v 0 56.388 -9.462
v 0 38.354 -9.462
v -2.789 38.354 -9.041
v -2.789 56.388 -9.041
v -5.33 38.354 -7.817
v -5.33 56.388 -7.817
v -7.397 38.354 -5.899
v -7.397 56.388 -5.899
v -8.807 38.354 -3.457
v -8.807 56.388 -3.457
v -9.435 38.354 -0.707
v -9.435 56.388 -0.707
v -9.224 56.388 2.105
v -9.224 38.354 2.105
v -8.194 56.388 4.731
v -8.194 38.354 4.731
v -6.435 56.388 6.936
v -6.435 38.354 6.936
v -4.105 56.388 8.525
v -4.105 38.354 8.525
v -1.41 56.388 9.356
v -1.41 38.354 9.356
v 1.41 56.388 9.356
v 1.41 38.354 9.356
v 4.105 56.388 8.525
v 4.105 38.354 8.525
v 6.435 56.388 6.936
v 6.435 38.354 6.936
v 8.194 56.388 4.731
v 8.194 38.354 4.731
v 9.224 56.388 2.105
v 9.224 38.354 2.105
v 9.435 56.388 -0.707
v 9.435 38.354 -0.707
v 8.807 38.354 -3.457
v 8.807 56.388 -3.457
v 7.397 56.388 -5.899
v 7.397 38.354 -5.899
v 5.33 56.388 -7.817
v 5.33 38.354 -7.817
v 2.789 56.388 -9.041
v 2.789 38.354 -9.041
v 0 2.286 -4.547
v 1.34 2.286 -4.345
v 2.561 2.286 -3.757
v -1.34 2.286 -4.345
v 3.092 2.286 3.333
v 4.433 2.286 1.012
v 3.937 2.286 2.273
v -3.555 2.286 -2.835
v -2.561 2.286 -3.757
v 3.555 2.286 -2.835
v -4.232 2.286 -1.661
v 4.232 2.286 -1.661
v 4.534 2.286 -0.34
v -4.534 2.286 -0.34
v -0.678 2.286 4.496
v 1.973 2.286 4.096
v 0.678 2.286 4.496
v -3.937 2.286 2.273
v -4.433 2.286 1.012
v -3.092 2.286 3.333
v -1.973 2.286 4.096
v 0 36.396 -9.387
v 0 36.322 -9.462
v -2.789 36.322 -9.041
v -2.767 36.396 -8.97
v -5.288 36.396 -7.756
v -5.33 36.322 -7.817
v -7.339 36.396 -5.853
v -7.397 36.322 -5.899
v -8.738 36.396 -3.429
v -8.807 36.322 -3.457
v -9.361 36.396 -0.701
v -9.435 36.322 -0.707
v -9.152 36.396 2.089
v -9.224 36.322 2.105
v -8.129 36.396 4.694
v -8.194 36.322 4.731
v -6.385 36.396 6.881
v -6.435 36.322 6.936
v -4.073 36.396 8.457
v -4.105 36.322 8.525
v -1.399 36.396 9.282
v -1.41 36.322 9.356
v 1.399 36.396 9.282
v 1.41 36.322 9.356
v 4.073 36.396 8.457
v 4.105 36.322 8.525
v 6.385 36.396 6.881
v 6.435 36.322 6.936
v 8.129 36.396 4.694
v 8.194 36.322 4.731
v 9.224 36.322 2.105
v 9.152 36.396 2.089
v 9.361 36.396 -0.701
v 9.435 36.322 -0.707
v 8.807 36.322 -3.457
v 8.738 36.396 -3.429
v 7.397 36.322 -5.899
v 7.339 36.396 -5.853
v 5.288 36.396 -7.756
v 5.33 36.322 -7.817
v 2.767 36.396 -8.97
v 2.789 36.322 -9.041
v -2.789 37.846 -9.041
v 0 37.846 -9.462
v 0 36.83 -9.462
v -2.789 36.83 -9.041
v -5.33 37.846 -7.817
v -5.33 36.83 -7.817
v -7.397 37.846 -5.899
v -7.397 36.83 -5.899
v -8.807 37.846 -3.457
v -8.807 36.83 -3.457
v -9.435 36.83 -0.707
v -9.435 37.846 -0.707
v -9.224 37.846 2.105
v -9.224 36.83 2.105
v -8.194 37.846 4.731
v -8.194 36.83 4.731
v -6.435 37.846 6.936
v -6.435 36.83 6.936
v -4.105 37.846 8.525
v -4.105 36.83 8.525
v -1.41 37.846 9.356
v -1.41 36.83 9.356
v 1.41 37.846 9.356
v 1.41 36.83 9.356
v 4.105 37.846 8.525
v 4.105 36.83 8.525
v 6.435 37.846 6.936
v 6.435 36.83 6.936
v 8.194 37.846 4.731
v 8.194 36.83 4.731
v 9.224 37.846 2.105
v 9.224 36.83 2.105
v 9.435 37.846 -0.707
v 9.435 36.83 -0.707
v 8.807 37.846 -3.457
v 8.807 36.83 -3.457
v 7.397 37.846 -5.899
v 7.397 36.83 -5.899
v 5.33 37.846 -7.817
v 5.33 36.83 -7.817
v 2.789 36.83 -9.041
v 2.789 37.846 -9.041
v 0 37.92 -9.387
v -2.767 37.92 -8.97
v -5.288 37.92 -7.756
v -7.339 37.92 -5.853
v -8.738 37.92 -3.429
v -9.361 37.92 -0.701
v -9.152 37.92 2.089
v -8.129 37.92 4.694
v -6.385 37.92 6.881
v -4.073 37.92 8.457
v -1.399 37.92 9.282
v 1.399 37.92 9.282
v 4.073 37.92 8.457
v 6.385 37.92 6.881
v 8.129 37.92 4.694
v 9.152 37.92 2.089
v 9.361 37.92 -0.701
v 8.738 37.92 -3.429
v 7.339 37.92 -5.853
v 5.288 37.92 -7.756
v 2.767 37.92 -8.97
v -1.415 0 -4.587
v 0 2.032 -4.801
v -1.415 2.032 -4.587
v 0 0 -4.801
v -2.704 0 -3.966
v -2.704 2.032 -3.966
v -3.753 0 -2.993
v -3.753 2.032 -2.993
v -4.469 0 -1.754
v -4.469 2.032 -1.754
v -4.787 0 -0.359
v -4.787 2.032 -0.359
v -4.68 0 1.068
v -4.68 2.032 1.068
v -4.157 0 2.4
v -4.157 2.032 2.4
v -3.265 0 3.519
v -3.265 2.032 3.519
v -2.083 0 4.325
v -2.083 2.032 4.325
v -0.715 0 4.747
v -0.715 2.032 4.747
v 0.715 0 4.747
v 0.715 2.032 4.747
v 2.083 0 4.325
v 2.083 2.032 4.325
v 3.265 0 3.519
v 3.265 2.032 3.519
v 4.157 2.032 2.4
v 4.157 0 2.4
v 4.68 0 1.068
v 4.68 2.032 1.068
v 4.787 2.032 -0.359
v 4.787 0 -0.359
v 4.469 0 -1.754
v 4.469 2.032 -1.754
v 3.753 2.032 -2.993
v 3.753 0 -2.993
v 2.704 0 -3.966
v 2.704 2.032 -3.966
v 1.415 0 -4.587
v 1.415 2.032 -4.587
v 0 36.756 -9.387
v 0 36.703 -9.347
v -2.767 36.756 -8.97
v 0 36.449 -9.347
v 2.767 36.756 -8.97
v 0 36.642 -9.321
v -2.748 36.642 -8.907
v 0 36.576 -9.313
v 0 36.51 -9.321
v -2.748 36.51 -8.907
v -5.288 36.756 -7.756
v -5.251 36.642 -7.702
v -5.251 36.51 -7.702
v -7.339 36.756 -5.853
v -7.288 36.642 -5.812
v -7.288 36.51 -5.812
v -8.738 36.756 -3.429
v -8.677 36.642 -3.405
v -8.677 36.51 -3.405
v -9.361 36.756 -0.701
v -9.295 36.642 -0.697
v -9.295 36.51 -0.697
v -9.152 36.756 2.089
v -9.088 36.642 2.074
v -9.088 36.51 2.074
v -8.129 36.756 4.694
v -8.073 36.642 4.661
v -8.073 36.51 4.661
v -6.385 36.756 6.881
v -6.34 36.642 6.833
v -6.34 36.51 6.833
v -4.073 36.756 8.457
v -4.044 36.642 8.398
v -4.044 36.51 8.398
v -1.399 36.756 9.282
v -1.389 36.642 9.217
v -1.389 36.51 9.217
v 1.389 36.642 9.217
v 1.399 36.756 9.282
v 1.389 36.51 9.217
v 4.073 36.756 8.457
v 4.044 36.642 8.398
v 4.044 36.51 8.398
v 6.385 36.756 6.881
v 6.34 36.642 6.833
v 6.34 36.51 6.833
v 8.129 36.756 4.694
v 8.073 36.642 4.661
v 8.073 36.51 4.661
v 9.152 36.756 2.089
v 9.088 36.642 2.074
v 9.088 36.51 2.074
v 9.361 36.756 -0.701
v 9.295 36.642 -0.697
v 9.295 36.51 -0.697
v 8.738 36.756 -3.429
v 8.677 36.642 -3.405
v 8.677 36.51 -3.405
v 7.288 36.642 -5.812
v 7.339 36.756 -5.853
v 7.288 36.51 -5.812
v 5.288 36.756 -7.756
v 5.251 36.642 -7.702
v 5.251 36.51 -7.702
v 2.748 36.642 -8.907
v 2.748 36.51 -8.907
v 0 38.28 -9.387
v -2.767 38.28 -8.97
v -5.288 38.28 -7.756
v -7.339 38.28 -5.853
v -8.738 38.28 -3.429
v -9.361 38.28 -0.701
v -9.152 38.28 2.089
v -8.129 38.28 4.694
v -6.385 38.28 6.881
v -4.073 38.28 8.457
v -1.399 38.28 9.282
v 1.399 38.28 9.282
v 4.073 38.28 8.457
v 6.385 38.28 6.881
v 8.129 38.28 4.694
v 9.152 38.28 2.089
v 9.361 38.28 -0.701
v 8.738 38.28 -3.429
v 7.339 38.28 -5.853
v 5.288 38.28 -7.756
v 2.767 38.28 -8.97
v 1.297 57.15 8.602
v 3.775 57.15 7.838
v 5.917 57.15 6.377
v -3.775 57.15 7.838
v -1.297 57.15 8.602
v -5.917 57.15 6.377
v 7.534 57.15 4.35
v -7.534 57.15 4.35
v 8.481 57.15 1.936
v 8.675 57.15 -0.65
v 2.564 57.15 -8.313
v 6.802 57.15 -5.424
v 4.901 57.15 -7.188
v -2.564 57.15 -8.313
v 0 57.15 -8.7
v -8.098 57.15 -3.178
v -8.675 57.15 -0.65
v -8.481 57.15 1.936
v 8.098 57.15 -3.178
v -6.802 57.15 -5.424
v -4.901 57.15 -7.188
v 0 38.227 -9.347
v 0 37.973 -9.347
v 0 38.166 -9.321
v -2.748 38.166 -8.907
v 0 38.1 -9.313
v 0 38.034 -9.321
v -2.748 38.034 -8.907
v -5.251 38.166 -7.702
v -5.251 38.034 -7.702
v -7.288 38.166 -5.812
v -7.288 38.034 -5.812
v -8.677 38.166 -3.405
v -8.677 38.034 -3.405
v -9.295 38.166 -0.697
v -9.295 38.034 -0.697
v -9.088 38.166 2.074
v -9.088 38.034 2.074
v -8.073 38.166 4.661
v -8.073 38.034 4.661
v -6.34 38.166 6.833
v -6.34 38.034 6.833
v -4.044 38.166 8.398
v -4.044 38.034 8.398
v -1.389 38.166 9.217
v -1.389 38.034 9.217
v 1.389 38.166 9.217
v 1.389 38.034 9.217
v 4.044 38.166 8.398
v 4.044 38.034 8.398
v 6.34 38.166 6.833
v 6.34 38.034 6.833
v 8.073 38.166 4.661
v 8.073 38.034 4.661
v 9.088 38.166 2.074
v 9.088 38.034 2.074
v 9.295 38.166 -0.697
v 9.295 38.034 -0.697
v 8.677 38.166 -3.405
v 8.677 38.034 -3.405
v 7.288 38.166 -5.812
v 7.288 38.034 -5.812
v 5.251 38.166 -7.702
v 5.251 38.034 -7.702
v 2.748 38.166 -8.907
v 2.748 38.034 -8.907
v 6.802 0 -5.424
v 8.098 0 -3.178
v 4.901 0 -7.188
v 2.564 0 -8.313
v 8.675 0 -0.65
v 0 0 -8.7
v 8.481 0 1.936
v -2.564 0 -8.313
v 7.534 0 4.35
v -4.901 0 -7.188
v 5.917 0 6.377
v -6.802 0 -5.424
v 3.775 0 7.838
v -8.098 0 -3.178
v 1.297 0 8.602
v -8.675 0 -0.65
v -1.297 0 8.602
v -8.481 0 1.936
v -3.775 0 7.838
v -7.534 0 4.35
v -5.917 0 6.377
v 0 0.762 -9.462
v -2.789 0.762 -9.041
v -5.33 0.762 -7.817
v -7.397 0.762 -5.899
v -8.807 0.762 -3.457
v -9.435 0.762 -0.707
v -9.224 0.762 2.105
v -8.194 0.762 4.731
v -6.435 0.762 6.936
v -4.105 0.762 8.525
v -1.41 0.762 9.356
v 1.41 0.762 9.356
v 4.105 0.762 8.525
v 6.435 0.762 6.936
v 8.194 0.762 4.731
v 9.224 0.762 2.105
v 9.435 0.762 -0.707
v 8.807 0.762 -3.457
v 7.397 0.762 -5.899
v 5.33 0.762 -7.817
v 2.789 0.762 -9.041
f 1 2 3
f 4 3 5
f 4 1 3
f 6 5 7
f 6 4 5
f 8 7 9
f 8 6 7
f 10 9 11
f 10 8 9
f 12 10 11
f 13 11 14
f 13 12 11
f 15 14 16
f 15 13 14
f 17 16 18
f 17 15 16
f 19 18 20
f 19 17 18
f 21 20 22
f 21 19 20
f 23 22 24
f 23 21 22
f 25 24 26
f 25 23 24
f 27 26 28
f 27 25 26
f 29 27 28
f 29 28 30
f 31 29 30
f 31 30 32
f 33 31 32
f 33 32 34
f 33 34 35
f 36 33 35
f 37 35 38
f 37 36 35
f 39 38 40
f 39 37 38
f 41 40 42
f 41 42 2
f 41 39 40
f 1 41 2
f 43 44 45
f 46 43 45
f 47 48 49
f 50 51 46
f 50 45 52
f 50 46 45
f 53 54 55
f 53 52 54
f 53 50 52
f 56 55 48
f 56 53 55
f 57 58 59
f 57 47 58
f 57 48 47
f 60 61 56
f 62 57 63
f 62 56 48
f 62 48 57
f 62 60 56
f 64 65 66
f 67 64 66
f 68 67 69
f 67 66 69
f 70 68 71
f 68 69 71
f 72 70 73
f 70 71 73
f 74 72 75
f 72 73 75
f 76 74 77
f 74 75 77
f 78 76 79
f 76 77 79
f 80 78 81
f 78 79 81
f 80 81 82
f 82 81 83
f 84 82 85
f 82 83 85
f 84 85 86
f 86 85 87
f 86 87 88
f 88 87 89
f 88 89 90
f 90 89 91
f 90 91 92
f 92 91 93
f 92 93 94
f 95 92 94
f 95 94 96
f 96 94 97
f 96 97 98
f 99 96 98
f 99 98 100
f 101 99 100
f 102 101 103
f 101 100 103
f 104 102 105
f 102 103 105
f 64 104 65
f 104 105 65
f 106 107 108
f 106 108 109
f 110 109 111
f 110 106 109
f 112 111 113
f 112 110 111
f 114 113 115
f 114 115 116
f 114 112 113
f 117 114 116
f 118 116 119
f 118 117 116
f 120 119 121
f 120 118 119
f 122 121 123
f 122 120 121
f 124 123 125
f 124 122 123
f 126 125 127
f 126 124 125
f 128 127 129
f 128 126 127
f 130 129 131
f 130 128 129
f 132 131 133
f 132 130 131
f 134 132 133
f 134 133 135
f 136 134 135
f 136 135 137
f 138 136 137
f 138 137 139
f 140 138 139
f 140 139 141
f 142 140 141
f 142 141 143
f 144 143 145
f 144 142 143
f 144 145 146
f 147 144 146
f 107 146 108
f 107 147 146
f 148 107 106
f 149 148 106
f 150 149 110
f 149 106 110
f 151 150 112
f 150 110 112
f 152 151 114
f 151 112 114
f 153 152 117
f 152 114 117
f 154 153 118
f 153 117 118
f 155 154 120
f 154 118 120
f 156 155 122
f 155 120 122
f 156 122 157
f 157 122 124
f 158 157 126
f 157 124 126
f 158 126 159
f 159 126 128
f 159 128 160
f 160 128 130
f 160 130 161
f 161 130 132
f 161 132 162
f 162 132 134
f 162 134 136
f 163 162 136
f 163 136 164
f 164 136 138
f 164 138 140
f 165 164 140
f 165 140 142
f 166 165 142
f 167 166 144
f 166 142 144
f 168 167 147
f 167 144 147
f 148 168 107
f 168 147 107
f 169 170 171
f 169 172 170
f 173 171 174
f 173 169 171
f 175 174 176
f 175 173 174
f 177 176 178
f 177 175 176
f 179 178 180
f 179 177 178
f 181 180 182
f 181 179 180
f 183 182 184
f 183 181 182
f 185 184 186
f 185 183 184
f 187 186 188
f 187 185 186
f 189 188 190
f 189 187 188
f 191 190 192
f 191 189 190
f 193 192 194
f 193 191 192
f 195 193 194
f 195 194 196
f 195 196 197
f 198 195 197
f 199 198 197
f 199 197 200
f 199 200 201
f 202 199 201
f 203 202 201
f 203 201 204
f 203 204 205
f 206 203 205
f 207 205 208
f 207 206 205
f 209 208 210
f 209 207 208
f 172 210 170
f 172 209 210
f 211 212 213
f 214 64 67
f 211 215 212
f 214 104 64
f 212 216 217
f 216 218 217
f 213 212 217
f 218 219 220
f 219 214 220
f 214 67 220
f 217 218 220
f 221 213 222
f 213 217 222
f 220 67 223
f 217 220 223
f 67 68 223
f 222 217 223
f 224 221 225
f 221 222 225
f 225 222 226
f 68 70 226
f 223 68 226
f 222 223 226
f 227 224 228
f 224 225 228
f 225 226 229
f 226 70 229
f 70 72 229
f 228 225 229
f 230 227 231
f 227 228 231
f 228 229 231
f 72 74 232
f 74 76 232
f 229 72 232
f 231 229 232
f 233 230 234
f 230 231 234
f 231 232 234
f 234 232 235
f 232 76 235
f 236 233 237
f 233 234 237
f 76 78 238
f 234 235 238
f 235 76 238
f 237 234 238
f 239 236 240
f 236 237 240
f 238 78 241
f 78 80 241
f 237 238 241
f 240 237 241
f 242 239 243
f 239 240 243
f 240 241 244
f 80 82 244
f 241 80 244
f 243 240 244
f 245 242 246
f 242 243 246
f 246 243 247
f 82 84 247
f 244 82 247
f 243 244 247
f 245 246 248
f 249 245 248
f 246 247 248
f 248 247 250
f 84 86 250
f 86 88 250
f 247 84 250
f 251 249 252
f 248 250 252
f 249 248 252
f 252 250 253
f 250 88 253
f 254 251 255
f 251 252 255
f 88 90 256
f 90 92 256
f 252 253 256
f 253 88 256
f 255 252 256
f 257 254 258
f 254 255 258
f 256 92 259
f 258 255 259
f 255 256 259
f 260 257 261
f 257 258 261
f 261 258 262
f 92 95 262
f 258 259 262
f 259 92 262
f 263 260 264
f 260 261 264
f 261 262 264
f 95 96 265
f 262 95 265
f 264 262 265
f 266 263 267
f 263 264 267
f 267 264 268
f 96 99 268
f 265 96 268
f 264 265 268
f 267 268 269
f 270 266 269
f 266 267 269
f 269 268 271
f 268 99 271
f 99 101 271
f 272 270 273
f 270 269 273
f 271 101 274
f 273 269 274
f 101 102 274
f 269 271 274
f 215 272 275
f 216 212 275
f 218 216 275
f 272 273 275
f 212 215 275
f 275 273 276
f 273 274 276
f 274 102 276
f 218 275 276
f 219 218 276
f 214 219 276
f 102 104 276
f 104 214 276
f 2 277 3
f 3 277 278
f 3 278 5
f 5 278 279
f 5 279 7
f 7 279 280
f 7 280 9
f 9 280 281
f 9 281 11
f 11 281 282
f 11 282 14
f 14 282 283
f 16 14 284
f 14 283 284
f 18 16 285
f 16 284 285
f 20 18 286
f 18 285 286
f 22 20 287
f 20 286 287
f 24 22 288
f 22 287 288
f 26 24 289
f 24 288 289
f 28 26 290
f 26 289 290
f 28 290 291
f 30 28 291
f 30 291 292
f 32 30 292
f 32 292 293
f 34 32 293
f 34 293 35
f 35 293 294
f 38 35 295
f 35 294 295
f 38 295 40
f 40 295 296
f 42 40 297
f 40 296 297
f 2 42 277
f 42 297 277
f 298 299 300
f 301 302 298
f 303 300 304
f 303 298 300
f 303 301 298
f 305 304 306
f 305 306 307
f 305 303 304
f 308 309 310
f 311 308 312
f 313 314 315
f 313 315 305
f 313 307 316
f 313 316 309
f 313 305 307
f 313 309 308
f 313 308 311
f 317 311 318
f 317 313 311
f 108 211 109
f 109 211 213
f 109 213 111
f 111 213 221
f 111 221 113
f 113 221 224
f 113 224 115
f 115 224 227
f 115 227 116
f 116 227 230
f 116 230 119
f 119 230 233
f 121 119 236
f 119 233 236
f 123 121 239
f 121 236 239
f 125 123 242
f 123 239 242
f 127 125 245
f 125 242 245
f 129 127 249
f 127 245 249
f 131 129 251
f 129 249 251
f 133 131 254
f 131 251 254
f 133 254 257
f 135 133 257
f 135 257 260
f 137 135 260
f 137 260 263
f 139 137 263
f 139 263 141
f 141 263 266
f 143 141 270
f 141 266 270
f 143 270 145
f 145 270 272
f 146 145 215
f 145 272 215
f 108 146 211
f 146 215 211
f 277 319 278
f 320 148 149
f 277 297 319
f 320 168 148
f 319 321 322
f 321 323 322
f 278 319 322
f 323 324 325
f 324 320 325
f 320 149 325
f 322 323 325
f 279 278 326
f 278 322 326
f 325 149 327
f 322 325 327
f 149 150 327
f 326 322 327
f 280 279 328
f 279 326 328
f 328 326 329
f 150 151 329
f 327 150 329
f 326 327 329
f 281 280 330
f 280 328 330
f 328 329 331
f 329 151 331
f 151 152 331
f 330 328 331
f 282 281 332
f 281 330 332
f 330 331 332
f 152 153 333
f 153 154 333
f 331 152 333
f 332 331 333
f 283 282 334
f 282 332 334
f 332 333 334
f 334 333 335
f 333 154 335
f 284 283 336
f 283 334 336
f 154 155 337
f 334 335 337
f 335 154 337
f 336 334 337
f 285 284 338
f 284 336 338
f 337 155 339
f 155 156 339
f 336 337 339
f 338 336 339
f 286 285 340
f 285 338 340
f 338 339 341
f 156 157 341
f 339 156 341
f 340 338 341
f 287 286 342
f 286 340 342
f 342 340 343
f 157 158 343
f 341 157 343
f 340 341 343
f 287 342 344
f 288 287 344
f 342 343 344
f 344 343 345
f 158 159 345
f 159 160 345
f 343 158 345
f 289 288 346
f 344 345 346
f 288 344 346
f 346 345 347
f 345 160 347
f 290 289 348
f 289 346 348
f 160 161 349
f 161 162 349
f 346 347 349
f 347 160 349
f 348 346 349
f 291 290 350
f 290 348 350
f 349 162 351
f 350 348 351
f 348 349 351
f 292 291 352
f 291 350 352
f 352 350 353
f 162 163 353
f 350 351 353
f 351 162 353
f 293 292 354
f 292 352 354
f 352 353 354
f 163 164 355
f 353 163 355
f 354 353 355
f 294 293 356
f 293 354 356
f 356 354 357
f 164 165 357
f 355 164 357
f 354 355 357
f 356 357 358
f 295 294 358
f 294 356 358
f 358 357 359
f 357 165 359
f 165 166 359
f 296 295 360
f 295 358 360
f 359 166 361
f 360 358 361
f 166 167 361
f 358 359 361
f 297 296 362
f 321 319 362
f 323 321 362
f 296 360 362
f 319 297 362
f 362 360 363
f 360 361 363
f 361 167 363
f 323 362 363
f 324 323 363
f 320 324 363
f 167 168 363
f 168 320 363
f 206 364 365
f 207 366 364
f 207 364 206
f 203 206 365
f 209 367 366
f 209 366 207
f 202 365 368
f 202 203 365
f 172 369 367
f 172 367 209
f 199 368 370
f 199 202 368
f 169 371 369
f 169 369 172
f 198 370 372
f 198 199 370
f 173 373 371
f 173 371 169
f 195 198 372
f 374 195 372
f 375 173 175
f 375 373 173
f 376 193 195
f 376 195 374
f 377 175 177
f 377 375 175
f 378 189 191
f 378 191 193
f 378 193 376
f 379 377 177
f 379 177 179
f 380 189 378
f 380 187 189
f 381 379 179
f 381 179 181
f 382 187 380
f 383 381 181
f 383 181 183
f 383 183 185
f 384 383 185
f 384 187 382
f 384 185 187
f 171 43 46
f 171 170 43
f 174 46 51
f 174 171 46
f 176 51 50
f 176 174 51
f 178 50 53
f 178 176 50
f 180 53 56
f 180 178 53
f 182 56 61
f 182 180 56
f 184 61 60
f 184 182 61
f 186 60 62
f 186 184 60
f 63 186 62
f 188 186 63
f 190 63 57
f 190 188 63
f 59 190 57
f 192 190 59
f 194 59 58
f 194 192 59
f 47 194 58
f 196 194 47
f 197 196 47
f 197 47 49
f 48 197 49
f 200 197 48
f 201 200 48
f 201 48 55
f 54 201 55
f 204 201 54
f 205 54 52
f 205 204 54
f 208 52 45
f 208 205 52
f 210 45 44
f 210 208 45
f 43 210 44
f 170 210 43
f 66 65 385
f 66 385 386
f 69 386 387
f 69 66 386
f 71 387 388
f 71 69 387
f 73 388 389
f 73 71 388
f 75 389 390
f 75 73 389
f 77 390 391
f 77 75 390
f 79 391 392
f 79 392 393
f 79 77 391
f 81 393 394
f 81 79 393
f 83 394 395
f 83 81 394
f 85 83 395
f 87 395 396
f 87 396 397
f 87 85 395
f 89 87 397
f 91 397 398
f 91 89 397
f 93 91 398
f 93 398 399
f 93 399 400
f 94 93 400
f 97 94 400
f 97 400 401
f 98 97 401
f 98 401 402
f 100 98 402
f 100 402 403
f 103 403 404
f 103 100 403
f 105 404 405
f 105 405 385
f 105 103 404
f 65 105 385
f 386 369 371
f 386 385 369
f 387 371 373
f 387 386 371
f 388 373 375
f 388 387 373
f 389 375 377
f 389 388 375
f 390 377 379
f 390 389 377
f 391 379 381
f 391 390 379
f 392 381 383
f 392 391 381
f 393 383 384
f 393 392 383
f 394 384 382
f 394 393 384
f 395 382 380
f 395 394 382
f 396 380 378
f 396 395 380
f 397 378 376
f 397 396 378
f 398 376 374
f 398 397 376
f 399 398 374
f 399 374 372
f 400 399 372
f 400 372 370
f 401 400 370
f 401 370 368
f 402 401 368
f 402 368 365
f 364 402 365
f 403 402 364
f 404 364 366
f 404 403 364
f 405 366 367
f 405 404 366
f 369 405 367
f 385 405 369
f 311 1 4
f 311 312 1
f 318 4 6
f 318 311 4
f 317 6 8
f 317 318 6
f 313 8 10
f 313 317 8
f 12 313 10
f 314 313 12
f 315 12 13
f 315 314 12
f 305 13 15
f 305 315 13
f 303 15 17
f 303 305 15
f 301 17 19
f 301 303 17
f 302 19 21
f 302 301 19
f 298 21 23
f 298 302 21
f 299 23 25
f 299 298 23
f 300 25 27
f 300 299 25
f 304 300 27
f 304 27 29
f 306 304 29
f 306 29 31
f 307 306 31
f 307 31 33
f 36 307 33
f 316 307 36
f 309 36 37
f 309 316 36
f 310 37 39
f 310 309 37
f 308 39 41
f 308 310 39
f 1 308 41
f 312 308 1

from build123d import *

# Parameters (mm, degrees)
LPATTERN1_COUNT = 2
LPATTERN1_PITCH = 1.524


with BuildPart() as part:
    # Sketch1 → Revolve1 (revolve)
    with BuildSketch(Plane.XY, mode=Mode.PRIVATE) as revolve1_sk:
        Polygon((9.4615, 0.762), (9.4615, 56.388), (8.6995, 57.15), (0, 57.15), (0, 2.286), (4.5466, 2.286), (4.8006, 2.032), (4.8006, 0), (8.6995, 0), align=None)
    revolve(revolve1_sk.sketch.rotate(Axis((0, 0, 0), (0, 1, 0)), 90), axis=Axis((0, 0, 0), (0, 1, 0)))  # turned: the seam where the file's is

    # Sketch2 → Cut-Revolve1 (revolve, cut)
    with BuildSketch(Plane.XY, mode=Mode.PRIVATE) as cut_revolve1_sk:
        with BuildLine():
            Line((9.525, 36.2585), (9.525, 36.8935))
            Line((9.525, 36.8935), (9.387105122, 36.755605122))
            ThreePointArc((9.387105122, 36.755605122), (9.312710245, 36.576), (9.387105122, 36.396394878))
            Line((9.387105122, 36.396394878), (9.525, 36.2585))
        make_face()
    cut_revolve1 = revolve(cut_revolve1_sk.sketch.rotate(Axis((0, 0, 0), (0, 1, 0)), 90), axis=Axis((0, 0, 0), (0, 1, 0)), mode=Mode.SUBTRACT)  # turned: the seam where the file's is

    # LPattern1: Cut-Revolve1 ×2
    with Locations(*[(0, i * LPATTERN1_PITCH, 0) for i in range(1, LPATTERN1_COUNT)]):
        add(cut_revolve1, mode=Mode.SUBTRACT)


solid = part.part
